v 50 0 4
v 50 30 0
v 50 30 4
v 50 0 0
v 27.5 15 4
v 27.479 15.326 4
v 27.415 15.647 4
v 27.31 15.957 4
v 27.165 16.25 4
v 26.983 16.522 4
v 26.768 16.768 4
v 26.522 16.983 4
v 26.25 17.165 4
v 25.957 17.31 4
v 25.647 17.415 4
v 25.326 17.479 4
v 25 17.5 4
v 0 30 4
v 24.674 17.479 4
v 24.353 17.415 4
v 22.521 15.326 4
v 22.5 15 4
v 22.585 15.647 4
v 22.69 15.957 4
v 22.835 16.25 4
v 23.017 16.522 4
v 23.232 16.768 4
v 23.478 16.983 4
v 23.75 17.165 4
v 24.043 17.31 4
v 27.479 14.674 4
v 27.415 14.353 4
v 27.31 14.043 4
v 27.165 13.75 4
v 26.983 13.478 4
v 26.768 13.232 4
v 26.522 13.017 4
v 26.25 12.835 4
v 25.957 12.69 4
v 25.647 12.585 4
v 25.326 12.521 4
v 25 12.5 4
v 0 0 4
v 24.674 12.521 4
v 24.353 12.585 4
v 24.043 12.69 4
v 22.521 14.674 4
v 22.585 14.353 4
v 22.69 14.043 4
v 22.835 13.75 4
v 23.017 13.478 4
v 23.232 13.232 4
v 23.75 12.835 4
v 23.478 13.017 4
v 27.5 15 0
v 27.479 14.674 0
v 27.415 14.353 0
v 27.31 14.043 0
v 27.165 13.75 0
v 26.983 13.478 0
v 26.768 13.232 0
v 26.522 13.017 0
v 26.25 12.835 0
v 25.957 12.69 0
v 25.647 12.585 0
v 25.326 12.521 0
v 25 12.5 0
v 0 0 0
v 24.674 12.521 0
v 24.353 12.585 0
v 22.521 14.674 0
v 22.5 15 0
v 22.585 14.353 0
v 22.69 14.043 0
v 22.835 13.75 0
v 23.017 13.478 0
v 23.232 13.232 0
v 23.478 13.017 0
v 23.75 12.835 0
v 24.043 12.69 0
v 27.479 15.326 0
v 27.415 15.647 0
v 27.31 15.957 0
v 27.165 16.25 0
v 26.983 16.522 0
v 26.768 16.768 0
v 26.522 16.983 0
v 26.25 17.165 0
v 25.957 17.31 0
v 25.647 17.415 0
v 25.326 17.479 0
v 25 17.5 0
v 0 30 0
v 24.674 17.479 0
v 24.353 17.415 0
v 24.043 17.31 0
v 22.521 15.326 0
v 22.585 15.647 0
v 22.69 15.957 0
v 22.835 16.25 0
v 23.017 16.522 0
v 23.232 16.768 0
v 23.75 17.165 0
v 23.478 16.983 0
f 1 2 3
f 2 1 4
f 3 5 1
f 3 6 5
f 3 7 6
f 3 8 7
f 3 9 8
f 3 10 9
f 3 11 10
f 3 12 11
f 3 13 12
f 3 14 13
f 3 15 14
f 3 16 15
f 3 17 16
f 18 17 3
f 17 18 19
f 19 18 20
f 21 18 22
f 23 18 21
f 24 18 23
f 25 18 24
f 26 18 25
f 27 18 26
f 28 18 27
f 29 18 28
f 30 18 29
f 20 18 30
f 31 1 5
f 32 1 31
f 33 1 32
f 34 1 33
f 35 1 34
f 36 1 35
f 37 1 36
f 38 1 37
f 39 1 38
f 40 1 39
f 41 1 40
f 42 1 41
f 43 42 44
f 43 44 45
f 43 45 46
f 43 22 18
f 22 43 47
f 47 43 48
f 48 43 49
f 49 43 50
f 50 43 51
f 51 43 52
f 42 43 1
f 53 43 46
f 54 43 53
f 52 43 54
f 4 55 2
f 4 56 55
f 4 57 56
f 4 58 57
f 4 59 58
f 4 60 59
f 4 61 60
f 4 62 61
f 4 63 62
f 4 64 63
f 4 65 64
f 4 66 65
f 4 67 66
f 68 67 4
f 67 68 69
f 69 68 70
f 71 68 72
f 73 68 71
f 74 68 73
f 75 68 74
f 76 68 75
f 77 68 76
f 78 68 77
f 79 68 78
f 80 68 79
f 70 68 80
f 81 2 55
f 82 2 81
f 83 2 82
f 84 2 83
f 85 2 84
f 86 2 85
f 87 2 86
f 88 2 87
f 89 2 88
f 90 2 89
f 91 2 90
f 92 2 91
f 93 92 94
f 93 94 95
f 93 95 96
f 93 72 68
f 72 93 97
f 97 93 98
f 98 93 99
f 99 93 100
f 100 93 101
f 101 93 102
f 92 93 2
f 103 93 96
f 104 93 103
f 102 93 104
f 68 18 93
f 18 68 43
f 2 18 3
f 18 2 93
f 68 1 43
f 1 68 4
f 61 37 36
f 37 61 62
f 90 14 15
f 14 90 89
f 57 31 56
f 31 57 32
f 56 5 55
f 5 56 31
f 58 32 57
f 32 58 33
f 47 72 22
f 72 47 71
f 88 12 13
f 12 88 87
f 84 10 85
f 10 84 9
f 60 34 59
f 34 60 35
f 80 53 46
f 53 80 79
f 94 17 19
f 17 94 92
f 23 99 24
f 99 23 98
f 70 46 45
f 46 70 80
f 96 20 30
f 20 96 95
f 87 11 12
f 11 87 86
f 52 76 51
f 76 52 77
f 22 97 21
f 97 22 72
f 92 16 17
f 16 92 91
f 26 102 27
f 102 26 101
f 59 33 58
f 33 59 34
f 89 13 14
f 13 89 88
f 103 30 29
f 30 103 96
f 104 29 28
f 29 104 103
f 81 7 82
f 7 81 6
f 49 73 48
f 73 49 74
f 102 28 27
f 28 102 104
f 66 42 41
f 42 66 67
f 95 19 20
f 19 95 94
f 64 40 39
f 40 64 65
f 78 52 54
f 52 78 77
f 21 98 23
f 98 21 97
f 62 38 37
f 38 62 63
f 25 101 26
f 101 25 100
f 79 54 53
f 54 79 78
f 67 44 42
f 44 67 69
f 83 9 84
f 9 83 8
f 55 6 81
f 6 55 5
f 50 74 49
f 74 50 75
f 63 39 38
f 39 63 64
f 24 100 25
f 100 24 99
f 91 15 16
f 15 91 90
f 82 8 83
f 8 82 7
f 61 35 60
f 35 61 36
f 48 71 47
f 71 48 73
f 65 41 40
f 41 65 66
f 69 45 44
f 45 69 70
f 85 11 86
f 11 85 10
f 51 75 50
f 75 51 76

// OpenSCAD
// units=mm — generated by scad_emitter.py
// part=param part
$fn = 48;

w = 50;
d = 30;
t = 4;
hole_d = 5;

difference() { cube([50, 30, 4]); translate([25, 15, 4.5]) rotate([180, 0, 0]) cylinder(h=5, r=2.5, $fn=$fn); }
